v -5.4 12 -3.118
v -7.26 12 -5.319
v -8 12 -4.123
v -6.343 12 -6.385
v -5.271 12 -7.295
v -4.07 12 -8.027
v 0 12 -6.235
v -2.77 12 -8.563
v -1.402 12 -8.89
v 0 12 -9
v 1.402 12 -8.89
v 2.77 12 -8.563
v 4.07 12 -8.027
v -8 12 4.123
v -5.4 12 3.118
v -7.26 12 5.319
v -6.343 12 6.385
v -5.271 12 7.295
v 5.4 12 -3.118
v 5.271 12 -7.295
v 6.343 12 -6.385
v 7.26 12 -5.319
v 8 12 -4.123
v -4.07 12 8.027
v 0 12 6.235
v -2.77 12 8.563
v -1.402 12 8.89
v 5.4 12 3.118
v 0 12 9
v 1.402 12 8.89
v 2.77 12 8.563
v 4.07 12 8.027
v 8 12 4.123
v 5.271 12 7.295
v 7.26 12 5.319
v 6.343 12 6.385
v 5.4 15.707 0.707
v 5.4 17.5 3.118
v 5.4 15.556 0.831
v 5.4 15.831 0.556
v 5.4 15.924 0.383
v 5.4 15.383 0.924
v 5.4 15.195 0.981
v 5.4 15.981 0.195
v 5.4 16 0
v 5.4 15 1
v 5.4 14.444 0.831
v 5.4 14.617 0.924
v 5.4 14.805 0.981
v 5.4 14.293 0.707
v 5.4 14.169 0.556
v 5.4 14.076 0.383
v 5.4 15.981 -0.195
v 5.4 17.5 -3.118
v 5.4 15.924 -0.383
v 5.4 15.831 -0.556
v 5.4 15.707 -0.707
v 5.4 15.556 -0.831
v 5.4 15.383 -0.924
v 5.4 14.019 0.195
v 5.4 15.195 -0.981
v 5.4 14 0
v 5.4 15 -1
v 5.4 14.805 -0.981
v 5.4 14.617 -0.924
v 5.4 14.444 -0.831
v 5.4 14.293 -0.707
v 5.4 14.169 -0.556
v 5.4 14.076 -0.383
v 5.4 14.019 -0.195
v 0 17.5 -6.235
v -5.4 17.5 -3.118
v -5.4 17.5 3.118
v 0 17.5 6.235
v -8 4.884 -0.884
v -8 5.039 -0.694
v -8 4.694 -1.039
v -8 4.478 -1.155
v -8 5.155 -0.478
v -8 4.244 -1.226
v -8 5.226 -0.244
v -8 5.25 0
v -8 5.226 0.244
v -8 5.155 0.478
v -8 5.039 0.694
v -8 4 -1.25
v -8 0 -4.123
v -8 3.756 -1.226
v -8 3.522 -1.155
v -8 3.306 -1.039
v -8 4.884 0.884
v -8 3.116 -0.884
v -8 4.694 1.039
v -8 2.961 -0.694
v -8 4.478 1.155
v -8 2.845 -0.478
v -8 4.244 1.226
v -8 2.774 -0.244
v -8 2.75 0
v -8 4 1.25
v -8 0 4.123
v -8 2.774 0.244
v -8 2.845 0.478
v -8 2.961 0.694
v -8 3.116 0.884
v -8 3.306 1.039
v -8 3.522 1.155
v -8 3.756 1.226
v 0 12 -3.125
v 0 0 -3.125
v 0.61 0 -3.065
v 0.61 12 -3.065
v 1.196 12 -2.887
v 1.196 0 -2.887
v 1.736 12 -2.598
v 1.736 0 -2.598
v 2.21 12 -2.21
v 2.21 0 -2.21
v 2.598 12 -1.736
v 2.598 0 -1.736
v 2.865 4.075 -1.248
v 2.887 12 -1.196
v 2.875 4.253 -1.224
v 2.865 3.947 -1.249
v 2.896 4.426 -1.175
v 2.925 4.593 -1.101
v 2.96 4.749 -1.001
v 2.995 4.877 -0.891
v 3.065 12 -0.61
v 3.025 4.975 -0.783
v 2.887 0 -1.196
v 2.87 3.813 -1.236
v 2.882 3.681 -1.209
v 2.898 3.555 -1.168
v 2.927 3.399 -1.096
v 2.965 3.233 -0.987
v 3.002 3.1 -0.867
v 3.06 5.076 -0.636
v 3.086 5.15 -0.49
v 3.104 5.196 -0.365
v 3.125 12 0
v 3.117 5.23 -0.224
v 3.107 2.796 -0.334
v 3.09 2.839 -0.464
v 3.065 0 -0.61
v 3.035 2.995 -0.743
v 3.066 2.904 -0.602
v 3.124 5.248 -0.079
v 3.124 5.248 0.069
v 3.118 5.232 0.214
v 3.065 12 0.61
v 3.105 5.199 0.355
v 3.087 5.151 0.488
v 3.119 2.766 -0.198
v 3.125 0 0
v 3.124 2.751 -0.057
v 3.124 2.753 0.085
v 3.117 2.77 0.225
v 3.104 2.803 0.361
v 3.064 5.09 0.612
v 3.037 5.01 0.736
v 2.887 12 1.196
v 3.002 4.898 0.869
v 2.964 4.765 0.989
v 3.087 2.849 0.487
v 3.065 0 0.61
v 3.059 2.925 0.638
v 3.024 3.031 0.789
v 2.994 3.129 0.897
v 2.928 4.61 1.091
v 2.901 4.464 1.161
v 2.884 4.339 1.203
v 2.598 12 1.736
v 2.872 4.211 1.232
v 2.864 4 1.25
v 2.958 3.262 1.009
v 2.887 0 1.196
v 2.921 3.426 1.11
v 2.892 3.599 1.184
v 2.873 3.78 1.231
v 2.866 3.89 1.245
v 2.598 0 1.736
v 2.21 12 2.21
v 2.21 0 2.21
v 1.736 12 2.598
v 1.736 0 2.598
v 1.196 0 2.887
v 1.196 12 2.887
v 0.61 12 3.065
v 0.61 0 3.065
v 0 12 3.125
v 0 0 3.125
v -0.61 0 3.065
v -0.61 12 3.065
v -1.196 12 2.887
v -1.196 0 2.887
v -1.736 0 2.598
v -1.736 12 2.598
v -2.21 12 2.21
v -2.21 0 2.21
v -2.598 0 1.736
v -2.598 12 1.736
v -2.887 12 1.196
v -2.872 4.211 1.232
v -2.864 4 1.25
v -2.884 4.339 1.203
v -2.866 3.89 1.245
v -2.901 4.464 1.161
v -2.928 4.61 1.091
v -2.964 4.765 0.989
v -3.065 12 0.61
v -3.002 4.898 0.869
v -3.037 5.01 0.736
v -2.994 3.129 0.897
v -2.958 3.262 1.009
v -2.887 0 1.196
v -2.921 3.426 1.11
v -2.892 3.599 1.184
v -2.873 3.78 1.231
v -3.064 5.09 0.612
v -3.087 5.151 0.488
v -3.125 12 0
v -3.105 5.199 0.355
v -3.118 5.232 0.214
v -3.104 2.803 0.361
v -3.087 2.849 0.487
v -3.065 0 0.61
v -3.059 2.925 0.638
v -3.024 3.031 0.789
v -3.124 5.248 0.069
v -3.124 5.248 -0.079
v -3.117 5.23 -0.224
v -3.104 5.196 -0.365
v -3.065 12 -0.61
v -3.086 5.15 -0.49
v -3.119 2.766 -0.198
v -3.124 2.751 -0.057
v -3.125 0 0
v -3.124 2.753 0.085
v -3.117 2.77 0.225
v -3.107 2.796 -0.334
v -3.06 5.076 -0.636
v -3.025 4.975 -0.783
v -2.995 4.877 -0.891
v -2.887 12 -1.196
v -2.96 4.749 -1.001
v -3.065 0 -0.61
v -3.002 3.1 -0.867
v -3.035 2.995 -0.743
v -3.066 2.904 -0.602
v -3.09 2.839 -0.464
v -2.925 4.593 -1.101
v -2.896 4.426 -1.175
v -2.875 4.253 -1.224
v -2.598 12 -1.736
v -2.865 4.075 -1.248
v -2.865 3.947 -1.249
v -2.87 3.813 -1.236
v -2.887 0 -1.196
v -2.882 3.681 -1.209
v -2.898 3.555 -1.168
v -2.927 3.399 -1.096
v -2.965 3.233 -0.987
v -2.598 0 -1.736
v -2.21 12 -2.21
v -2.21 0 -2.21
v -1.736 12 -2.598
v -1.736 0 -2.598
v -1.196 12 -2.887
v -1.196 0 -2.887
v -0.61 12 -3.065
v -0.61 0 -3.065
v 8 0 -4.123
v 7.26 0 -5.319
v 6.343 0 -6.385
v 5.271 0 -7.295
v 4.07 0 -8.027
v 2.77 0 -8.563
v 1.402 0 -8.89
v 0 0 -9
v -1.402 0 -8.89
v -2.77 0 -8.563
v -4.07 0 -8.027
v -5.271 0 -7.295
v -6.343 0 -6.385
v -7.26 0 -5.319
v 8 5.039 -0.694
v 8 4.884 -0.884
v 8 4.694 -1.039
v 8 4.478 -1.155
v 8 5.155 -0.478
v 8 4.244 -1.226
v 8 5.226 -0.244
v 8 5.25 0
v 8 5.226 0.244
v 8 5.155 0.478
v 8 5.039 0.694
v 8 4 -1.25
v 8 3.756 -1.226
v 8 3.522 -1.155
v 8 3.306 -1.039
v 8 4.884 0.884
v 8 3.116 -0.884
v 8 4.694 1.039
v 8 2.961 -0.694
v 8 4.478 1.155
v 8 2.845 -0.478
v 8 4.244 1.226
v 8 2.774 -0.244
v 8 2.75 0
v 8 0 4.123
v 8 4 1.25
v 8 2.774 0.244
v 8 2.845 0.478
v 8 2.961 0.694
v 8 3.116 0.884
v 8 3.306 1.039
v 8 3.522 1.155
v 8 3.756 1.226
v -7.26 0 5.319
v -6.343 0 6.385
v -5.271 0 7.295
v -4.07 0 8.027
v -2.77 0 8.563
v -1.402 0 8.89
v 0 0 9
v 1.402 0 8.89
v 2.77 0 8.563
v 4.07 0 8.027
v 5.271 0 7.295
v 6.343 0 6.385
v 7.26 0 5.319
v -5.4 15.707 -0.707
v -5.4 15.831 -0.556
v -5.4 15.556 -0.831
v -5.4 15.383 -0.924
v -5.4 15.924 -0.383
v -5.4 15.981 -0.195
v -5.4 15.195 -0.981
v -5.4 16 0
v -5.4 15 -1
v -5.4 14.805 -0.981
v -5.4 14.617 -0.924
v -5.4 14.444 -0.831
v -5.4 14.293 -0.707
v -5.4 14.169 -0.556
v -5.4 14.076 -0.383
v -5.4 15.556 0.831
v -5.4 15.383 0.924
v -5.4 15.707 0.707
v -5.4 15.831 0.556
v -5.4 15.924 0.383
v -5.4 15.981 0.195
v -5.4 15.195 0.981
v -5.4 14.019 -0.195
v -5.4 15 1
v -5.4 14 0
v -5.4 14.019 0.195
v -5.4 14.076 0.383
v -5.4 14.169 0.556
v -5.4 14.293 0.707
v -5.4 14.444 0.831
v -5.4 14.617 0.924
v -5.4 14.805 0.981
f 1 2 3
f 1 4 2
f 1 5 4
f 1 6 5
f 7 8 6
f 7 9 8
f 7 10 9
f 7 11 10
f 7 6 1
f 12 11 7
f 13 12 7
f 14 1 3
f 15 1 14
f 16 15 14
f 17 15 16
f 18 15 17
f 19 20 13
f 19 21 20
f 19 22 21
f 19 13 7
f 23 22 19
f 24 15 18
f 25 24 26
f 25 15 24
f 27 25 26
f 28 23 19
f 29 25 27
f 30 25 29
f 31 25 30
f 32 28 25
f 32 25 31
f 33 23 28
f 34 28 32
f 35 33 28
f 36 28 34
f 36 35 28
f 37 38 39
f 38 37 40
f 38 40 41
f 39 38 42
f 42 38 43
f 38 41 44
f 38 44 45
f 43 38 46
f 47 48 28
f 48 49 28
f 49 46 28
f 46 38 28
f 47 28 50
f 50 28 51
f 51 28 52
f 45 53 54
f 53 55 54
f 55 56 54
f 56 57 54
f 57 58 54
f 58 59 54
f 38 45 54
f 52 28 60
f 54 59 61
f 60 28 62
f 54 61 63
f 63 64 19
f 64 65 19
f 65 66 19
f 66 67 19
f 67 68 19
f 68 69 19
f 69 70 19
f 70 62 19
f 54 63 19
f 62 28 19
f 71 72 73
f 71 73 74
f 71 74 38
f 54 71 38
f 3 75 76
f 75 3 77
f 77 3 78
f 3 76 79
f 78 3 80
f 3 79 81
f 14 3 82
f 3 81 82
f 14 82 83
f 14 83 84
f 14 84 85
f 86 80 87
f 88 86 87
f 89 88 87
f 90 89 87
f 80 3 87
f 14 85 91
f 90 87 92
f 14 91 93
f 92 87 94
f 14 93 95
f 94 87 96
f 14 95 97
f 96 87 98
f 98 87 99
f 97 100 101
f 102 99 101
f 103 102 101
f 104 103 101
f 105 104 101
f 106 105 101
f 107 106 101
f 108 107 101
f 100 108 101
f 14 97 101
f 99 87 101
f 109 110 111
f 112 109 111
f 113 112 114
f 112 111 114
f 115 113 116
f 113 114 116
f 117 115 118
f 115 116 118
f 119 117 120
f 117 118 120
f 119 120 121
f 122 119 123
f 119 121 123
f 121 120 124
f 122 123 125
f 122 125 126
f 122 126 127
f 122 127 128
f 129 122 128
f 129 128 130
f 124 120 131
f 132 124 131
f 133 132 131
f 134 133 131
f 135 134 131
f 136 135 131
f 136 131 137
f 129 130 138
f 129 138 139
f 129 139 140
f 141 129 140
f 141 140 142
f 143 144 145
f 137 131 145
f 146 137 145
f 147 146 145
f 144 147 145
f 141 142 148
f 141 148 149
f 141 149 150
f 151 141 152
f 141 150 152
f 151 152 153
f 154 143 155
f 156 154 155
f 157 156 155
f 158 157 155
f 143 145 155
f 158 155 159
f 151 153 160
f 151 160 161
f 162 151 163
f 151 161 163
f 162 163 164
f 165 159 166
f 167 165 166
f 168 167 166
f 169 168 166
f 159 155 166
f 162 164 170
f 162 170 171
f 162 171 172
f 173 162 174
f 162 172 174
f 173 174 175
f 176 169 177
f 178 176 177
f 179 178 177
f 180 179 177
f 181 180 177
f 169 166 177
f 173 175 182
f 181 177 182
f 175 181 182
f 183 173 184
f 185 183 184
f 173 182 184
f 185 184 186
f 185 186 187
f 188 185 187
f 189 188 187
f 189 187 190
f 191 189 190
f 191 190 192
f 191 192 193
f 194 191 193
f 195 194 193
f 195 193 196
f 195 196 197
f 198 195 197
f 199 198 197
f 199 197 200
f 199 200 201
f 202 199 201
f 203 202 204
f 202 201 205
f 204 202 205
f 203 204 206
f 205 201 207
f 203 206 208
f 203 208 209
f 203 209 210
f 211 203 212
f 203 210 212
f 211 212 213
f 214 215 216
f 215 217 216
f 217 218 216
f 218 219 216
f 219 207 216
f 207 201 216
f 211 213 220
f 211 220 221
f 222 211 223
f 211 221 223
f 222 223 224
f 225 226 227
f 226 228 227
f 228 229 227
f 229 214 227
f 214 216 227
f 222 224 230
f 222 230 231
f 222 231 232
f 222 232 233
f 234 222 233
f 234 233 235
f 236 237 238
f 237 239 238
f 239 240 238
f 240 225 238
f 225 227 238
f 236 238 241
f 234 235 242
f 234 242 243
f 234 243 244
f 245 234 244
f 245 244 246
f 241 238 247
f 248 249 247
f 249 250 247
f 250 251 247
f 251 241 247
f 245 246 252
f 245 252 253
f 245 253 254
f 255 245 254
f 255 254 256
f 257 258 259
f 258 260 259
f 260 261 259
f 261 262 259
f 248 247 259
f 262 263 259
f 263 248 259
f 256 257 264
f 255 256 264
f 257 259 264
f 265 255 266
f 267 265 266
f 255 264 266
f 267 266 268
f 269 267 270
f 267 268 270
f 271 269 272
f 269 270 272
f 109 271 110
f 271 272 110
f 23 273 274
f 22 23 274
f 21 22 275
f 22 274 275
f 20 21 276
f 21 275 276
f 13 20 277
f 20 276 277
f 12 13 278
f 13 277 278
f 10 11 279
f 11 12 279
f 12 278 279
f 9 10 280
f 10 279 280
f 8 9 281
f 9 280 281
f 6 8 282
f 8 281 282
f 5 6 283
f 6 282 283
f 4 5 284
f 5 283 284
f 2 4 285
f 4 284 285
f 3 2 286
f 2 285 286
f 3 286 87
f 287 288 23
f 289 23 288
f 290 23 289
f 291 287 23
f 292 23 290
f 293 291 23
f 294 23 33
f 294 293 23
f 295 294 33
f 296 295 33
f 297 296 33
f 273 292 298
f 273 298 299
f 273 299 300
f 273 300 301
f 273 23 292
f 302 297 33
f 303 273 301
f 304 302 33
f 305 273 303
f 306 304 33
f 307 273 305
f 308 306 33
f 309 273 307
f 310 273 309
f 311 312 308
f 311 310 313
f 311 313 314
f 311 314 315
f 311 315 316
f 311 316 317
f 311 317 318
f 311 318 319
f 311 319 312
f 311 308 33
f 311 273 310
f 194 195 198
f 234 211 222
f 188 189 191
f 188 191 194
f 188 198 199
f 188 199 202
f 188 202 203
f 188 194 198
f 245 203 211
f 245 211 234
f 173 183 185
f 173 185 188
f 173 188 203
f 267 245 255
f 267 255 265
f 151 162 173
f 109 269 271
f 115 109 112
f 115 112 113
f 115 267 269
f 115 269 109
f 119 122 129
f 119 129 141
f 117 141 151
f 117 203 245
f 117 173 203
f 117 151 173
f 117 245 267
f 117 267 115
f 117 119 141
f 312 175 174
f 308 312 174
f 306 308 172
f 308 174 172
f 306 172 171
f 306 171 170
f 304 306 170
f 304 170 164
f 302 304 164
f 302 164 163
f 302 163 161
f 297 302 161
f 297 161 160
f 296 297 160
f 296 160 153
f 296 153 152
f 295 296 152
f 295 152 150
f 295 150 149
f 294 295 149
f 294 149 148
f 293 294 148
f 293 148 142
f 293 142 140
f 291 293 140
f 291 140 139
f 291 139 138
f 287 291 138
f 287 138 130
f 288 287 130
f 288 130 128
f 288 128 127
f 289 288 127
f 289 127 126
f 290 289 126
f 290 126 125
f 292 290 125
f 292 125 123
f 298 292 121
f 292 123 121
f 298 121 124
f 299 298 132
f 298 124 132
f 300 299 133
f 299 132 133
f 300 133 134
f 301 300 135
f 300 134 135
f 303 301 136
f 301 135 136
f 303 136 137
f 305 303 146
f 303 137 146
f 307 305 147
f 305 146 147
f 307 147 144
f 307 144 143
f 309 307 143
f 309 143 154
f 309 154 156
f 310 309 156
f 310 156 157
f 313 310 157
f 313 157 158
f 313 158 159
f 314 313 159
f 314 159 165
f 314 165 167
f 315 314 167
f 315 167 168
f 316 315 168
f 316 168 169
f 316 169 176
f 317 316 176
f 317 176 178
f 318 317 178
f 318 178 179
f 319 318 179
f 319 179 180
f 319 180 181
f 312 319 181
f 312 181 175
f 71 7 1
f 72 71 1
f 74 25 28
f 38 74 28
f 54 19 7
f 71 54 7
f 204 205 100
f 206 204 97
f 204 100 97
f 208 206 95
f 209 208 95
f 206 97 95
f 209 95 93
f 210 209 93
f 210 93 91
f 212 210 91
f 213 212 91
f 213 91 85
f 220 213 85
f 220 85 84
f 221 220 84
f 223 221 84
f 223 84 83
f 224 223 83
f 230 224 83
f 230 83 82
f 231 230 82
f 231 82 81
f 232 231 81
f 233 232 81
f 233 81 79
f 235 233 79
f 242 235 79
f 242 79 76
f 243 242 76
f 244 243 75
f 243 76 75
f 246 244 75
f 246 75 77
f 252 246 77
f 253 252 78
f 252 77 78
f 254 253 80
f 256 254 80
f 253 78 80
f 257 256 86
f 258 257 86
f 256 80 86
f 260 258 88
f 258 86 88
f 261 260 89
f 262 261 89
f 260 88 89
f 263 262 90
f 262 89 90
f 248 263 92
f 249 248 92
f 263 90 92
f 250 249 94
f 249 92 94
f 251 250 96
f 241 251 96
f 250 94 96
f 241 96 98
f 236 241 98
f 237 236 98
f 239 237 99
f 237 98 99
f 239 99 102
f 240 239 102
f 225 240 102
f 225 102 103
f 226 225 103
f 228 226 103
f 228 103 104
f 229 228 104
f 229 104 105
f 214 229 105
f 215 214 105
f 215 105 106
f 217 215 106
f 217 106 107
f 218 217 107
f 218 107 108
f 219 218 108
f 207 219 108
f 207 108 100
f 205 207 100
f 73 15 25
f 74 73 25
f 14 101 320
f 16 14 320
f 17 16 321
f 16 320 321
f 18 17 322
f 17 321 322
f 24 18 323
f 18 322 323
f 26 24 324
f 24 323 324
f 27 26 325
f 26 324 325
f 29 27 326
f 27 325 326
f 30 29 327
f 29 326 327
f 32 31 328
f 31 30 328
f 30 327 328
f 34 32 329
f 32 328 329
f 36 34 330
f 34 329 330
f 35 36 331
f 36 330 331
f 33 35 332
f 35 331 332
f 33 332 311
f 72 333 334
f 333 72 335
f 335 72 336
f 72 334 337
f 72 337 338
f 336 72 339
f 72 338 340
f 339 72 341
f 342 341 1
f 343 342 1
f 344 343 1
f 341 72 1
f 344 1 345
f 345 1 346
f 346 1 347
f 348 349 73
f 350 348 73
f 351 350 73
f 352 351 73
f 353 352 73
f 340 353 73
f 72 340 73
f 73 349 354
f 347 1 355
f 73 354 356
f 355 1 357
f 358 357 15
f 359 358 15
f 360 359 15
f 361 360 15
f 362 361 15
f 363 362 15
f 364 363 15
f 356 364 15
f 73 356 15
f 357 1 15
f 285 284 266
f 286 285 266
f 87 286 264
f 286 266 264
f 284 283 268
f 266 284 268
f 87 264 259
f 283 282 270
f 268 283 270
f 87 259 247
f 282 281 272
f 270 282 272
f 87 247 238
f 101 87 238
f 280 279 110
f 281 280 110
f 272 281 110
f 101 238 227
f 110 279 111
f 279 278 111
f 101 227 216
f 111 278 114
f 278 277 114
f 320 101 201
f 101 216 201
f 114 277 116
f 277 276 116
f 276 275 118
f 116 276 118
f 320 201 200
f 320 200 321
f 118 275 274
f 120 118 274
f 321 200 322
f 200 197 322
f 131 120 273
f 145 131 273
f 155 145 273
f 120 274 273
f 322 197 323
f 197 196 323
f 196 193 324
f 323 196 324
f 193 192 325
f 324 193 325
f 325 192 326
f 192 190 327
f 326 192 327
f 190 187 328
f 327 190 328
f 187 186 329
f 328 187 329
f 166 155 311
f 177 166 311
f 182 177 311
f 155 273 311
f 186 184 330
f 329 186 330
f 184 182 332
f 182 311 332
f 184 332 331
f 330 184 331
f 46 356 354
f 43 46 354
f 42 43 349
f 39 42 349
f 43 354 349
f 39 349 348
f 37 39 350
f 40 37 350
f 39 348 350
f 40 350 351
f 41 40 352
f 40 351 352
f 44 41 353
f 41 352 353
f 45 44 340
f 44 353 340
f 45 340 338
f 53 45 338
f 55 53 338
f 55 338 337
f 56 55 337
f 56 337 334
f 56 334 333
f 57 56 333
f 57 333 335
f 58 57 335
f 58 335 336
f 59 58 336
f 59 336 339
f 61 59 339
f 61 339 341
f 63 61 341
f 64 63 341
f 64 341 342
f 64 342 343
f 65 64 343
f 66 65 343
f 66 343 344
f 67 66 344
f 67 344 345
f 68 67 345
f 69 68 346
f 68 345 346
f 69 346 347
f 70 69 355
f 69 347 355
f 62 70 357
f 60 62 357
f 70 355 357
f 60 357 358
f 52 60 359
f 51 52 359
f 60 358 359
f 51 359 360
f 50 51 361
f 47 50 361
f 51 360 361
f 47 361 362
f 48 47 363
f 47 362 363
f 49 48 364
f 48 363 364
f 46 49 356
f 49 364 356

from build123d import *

# Parameters (mm, degrees)
ESBO_O1_R                = 9
RESSALTO_EXTRUS_O1_DEPTH = 12
RESSALTO_EXTRUS_O2_DEPTH = 5.5
ESBO_O3_R                = 1
CORTE_EXTRUS_O1_DEPTH    = 25.384626304
ESBO_O4_R                = 3.125
CORTE_EXTRUS_O2_DEPTH    = 12
CORTE_EXTRUS_O3_REACH    = 23.639
ESBO_O6_R                = 1.25
CORTE_EXTRUS_O4_DEPTH    = 26.362373706


with BuildPart() as part:
    # Esboço1 → Ressalto-extrusão1 (new body)
    with BuildSketch(Plane(origin=(0, 0, 0), x_dir=(1, 0, 0), z_dir=(0, 1, 0))):
        with Locations(Location((0, 0, 0), (0, 0, 270))):
            Circle(ESBO_O1_R)
    extrude(amount=RESSALTO_EXTRUS_O1_DEPTH)

    # Esboço2 → Ressalto-extrusão2 (add)
    with BuildSketch(Plane(origin=(0, 12, 0), x_dir=(1, 0, 0), z_dir=(0, 1, 0))):
        Polygon((0, 6.235382907), (-5.4, 3.117691454), (-5.4, -3.117691454), (0, -6.235382907), (5.4, -3.117691454), (5.4, 3.117691454), align=None)
    extrude(amount=RESSALTO_EXTRUS_O2_DEPTH)

    # Esboço3 → Corte-extrusão1 (cut, through all)
    with BuildSketch(Plane.ZY.offset(5.4)):
        with Locations((0, 15)):
            Circle(ESBO_O3_R)
    extrude(amount=-CORTE_EXTRUS_O1_DEPTH, mode=Mode.SUBTRACT)

    # Esboço4 → Corte-extrusão2 (cut)
    with BuildSketch(Plane.XZ):
        with Locations(Location((0, 0, 0), (0, 0, 270))):
            Circle(ESBO_O4_R)
    extrude(amount=-CORTE_EXTRUS_O2_DEPTH, mode=Mode.SUBTRACT)

    # Esboço5 → Corte-extrusão3 (cut, up to next)
    with BuildSketch(Plane.XZ, mode=Mode.PRIVATE) as corte_extrus_o3_sk1:
        with BuildLine():
            Line((-8, -4.123105626), (-8, 4.123105626))
            ThreePointArc((-8, 4.123105626), (-9, 0), (-8, -4.123105626))
        make_face()
    corte_extrus_o3_tool1 = extrude(corte_extrus_o3_sk1.sketch, amount=-CORTE_EXTRUS_O3_REACH, mode=Mode.PRIVATE) & part.part
    # Esboço5 → Corte-extrusão3 (cut, up to next)
    with BuildSketch(Plane.XZ, mode=Mode.PRIVATE) as corte_extrus_o3_sk2:
        with BuildLine():
            Line((8, -4.123105626), (8, 4.123105626))
            ThreePointArc((8, 4.123105626), (9, 0), (8, -4.123105626))
        make_face()
    corte_extrus_o3_tool2 = extrude(corte_extrus_o3_sk2.sketch, amount=-CORTE_EXTRUS_O3_REACH, mode=Mode.PRIVATE) & part.part
    add(corte_extrus_o3_tool1.solids().sort_by_distance((-8.401968, 0, 0))[0], mode=Mode.SUBTRACT)
    add(corte_extrus_o3_tool2.solids().sort_by_distance((8.401968, 0, 0))[0], mode=Mode.SUBTRACT)

    # Esboço6 → Corte-extrusão4 (cut, through all)
    with BuildSketch(Plane.ZY.offset(8)):
        with Locations((0, 4)):
            Circle(ESBO_O6_R)
    extrude(amount=-CORTE_EXTRUS_O4_DEPTH, mode=Mode.SUBTRACT)


solid = part.part
